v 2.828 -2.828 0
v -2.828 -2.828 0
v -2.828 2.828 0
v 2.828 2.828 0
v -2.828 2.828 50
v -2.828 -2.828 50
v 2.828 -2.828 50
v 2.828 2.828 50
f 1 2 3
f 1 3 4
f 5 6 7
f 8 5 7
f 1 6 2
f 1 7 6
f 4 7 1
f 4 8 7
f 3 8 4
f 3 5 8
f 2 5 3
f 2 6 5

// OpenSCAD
// a special wall anchor with lost of adjustments
// (all sizes in millimenter)

module wall_anchor(
    drill_hole_dm = 8,  // drill hole diameter
    screw_dm = 5,       // screw diameter
    length = 50,     // anchor length
    oversize = 2,   // outer diameter oversize
    outer_taper = 0.75     // outer taper factor
) {
    outer_dm = drill_hole_dm + oversize;
    side_length = sqrt( pow(drill_hole_dm, 2 ) / 2 );
    
    linear_extrude( height = length )
        square( side_length, center = true);
    }

wall_anchor();
